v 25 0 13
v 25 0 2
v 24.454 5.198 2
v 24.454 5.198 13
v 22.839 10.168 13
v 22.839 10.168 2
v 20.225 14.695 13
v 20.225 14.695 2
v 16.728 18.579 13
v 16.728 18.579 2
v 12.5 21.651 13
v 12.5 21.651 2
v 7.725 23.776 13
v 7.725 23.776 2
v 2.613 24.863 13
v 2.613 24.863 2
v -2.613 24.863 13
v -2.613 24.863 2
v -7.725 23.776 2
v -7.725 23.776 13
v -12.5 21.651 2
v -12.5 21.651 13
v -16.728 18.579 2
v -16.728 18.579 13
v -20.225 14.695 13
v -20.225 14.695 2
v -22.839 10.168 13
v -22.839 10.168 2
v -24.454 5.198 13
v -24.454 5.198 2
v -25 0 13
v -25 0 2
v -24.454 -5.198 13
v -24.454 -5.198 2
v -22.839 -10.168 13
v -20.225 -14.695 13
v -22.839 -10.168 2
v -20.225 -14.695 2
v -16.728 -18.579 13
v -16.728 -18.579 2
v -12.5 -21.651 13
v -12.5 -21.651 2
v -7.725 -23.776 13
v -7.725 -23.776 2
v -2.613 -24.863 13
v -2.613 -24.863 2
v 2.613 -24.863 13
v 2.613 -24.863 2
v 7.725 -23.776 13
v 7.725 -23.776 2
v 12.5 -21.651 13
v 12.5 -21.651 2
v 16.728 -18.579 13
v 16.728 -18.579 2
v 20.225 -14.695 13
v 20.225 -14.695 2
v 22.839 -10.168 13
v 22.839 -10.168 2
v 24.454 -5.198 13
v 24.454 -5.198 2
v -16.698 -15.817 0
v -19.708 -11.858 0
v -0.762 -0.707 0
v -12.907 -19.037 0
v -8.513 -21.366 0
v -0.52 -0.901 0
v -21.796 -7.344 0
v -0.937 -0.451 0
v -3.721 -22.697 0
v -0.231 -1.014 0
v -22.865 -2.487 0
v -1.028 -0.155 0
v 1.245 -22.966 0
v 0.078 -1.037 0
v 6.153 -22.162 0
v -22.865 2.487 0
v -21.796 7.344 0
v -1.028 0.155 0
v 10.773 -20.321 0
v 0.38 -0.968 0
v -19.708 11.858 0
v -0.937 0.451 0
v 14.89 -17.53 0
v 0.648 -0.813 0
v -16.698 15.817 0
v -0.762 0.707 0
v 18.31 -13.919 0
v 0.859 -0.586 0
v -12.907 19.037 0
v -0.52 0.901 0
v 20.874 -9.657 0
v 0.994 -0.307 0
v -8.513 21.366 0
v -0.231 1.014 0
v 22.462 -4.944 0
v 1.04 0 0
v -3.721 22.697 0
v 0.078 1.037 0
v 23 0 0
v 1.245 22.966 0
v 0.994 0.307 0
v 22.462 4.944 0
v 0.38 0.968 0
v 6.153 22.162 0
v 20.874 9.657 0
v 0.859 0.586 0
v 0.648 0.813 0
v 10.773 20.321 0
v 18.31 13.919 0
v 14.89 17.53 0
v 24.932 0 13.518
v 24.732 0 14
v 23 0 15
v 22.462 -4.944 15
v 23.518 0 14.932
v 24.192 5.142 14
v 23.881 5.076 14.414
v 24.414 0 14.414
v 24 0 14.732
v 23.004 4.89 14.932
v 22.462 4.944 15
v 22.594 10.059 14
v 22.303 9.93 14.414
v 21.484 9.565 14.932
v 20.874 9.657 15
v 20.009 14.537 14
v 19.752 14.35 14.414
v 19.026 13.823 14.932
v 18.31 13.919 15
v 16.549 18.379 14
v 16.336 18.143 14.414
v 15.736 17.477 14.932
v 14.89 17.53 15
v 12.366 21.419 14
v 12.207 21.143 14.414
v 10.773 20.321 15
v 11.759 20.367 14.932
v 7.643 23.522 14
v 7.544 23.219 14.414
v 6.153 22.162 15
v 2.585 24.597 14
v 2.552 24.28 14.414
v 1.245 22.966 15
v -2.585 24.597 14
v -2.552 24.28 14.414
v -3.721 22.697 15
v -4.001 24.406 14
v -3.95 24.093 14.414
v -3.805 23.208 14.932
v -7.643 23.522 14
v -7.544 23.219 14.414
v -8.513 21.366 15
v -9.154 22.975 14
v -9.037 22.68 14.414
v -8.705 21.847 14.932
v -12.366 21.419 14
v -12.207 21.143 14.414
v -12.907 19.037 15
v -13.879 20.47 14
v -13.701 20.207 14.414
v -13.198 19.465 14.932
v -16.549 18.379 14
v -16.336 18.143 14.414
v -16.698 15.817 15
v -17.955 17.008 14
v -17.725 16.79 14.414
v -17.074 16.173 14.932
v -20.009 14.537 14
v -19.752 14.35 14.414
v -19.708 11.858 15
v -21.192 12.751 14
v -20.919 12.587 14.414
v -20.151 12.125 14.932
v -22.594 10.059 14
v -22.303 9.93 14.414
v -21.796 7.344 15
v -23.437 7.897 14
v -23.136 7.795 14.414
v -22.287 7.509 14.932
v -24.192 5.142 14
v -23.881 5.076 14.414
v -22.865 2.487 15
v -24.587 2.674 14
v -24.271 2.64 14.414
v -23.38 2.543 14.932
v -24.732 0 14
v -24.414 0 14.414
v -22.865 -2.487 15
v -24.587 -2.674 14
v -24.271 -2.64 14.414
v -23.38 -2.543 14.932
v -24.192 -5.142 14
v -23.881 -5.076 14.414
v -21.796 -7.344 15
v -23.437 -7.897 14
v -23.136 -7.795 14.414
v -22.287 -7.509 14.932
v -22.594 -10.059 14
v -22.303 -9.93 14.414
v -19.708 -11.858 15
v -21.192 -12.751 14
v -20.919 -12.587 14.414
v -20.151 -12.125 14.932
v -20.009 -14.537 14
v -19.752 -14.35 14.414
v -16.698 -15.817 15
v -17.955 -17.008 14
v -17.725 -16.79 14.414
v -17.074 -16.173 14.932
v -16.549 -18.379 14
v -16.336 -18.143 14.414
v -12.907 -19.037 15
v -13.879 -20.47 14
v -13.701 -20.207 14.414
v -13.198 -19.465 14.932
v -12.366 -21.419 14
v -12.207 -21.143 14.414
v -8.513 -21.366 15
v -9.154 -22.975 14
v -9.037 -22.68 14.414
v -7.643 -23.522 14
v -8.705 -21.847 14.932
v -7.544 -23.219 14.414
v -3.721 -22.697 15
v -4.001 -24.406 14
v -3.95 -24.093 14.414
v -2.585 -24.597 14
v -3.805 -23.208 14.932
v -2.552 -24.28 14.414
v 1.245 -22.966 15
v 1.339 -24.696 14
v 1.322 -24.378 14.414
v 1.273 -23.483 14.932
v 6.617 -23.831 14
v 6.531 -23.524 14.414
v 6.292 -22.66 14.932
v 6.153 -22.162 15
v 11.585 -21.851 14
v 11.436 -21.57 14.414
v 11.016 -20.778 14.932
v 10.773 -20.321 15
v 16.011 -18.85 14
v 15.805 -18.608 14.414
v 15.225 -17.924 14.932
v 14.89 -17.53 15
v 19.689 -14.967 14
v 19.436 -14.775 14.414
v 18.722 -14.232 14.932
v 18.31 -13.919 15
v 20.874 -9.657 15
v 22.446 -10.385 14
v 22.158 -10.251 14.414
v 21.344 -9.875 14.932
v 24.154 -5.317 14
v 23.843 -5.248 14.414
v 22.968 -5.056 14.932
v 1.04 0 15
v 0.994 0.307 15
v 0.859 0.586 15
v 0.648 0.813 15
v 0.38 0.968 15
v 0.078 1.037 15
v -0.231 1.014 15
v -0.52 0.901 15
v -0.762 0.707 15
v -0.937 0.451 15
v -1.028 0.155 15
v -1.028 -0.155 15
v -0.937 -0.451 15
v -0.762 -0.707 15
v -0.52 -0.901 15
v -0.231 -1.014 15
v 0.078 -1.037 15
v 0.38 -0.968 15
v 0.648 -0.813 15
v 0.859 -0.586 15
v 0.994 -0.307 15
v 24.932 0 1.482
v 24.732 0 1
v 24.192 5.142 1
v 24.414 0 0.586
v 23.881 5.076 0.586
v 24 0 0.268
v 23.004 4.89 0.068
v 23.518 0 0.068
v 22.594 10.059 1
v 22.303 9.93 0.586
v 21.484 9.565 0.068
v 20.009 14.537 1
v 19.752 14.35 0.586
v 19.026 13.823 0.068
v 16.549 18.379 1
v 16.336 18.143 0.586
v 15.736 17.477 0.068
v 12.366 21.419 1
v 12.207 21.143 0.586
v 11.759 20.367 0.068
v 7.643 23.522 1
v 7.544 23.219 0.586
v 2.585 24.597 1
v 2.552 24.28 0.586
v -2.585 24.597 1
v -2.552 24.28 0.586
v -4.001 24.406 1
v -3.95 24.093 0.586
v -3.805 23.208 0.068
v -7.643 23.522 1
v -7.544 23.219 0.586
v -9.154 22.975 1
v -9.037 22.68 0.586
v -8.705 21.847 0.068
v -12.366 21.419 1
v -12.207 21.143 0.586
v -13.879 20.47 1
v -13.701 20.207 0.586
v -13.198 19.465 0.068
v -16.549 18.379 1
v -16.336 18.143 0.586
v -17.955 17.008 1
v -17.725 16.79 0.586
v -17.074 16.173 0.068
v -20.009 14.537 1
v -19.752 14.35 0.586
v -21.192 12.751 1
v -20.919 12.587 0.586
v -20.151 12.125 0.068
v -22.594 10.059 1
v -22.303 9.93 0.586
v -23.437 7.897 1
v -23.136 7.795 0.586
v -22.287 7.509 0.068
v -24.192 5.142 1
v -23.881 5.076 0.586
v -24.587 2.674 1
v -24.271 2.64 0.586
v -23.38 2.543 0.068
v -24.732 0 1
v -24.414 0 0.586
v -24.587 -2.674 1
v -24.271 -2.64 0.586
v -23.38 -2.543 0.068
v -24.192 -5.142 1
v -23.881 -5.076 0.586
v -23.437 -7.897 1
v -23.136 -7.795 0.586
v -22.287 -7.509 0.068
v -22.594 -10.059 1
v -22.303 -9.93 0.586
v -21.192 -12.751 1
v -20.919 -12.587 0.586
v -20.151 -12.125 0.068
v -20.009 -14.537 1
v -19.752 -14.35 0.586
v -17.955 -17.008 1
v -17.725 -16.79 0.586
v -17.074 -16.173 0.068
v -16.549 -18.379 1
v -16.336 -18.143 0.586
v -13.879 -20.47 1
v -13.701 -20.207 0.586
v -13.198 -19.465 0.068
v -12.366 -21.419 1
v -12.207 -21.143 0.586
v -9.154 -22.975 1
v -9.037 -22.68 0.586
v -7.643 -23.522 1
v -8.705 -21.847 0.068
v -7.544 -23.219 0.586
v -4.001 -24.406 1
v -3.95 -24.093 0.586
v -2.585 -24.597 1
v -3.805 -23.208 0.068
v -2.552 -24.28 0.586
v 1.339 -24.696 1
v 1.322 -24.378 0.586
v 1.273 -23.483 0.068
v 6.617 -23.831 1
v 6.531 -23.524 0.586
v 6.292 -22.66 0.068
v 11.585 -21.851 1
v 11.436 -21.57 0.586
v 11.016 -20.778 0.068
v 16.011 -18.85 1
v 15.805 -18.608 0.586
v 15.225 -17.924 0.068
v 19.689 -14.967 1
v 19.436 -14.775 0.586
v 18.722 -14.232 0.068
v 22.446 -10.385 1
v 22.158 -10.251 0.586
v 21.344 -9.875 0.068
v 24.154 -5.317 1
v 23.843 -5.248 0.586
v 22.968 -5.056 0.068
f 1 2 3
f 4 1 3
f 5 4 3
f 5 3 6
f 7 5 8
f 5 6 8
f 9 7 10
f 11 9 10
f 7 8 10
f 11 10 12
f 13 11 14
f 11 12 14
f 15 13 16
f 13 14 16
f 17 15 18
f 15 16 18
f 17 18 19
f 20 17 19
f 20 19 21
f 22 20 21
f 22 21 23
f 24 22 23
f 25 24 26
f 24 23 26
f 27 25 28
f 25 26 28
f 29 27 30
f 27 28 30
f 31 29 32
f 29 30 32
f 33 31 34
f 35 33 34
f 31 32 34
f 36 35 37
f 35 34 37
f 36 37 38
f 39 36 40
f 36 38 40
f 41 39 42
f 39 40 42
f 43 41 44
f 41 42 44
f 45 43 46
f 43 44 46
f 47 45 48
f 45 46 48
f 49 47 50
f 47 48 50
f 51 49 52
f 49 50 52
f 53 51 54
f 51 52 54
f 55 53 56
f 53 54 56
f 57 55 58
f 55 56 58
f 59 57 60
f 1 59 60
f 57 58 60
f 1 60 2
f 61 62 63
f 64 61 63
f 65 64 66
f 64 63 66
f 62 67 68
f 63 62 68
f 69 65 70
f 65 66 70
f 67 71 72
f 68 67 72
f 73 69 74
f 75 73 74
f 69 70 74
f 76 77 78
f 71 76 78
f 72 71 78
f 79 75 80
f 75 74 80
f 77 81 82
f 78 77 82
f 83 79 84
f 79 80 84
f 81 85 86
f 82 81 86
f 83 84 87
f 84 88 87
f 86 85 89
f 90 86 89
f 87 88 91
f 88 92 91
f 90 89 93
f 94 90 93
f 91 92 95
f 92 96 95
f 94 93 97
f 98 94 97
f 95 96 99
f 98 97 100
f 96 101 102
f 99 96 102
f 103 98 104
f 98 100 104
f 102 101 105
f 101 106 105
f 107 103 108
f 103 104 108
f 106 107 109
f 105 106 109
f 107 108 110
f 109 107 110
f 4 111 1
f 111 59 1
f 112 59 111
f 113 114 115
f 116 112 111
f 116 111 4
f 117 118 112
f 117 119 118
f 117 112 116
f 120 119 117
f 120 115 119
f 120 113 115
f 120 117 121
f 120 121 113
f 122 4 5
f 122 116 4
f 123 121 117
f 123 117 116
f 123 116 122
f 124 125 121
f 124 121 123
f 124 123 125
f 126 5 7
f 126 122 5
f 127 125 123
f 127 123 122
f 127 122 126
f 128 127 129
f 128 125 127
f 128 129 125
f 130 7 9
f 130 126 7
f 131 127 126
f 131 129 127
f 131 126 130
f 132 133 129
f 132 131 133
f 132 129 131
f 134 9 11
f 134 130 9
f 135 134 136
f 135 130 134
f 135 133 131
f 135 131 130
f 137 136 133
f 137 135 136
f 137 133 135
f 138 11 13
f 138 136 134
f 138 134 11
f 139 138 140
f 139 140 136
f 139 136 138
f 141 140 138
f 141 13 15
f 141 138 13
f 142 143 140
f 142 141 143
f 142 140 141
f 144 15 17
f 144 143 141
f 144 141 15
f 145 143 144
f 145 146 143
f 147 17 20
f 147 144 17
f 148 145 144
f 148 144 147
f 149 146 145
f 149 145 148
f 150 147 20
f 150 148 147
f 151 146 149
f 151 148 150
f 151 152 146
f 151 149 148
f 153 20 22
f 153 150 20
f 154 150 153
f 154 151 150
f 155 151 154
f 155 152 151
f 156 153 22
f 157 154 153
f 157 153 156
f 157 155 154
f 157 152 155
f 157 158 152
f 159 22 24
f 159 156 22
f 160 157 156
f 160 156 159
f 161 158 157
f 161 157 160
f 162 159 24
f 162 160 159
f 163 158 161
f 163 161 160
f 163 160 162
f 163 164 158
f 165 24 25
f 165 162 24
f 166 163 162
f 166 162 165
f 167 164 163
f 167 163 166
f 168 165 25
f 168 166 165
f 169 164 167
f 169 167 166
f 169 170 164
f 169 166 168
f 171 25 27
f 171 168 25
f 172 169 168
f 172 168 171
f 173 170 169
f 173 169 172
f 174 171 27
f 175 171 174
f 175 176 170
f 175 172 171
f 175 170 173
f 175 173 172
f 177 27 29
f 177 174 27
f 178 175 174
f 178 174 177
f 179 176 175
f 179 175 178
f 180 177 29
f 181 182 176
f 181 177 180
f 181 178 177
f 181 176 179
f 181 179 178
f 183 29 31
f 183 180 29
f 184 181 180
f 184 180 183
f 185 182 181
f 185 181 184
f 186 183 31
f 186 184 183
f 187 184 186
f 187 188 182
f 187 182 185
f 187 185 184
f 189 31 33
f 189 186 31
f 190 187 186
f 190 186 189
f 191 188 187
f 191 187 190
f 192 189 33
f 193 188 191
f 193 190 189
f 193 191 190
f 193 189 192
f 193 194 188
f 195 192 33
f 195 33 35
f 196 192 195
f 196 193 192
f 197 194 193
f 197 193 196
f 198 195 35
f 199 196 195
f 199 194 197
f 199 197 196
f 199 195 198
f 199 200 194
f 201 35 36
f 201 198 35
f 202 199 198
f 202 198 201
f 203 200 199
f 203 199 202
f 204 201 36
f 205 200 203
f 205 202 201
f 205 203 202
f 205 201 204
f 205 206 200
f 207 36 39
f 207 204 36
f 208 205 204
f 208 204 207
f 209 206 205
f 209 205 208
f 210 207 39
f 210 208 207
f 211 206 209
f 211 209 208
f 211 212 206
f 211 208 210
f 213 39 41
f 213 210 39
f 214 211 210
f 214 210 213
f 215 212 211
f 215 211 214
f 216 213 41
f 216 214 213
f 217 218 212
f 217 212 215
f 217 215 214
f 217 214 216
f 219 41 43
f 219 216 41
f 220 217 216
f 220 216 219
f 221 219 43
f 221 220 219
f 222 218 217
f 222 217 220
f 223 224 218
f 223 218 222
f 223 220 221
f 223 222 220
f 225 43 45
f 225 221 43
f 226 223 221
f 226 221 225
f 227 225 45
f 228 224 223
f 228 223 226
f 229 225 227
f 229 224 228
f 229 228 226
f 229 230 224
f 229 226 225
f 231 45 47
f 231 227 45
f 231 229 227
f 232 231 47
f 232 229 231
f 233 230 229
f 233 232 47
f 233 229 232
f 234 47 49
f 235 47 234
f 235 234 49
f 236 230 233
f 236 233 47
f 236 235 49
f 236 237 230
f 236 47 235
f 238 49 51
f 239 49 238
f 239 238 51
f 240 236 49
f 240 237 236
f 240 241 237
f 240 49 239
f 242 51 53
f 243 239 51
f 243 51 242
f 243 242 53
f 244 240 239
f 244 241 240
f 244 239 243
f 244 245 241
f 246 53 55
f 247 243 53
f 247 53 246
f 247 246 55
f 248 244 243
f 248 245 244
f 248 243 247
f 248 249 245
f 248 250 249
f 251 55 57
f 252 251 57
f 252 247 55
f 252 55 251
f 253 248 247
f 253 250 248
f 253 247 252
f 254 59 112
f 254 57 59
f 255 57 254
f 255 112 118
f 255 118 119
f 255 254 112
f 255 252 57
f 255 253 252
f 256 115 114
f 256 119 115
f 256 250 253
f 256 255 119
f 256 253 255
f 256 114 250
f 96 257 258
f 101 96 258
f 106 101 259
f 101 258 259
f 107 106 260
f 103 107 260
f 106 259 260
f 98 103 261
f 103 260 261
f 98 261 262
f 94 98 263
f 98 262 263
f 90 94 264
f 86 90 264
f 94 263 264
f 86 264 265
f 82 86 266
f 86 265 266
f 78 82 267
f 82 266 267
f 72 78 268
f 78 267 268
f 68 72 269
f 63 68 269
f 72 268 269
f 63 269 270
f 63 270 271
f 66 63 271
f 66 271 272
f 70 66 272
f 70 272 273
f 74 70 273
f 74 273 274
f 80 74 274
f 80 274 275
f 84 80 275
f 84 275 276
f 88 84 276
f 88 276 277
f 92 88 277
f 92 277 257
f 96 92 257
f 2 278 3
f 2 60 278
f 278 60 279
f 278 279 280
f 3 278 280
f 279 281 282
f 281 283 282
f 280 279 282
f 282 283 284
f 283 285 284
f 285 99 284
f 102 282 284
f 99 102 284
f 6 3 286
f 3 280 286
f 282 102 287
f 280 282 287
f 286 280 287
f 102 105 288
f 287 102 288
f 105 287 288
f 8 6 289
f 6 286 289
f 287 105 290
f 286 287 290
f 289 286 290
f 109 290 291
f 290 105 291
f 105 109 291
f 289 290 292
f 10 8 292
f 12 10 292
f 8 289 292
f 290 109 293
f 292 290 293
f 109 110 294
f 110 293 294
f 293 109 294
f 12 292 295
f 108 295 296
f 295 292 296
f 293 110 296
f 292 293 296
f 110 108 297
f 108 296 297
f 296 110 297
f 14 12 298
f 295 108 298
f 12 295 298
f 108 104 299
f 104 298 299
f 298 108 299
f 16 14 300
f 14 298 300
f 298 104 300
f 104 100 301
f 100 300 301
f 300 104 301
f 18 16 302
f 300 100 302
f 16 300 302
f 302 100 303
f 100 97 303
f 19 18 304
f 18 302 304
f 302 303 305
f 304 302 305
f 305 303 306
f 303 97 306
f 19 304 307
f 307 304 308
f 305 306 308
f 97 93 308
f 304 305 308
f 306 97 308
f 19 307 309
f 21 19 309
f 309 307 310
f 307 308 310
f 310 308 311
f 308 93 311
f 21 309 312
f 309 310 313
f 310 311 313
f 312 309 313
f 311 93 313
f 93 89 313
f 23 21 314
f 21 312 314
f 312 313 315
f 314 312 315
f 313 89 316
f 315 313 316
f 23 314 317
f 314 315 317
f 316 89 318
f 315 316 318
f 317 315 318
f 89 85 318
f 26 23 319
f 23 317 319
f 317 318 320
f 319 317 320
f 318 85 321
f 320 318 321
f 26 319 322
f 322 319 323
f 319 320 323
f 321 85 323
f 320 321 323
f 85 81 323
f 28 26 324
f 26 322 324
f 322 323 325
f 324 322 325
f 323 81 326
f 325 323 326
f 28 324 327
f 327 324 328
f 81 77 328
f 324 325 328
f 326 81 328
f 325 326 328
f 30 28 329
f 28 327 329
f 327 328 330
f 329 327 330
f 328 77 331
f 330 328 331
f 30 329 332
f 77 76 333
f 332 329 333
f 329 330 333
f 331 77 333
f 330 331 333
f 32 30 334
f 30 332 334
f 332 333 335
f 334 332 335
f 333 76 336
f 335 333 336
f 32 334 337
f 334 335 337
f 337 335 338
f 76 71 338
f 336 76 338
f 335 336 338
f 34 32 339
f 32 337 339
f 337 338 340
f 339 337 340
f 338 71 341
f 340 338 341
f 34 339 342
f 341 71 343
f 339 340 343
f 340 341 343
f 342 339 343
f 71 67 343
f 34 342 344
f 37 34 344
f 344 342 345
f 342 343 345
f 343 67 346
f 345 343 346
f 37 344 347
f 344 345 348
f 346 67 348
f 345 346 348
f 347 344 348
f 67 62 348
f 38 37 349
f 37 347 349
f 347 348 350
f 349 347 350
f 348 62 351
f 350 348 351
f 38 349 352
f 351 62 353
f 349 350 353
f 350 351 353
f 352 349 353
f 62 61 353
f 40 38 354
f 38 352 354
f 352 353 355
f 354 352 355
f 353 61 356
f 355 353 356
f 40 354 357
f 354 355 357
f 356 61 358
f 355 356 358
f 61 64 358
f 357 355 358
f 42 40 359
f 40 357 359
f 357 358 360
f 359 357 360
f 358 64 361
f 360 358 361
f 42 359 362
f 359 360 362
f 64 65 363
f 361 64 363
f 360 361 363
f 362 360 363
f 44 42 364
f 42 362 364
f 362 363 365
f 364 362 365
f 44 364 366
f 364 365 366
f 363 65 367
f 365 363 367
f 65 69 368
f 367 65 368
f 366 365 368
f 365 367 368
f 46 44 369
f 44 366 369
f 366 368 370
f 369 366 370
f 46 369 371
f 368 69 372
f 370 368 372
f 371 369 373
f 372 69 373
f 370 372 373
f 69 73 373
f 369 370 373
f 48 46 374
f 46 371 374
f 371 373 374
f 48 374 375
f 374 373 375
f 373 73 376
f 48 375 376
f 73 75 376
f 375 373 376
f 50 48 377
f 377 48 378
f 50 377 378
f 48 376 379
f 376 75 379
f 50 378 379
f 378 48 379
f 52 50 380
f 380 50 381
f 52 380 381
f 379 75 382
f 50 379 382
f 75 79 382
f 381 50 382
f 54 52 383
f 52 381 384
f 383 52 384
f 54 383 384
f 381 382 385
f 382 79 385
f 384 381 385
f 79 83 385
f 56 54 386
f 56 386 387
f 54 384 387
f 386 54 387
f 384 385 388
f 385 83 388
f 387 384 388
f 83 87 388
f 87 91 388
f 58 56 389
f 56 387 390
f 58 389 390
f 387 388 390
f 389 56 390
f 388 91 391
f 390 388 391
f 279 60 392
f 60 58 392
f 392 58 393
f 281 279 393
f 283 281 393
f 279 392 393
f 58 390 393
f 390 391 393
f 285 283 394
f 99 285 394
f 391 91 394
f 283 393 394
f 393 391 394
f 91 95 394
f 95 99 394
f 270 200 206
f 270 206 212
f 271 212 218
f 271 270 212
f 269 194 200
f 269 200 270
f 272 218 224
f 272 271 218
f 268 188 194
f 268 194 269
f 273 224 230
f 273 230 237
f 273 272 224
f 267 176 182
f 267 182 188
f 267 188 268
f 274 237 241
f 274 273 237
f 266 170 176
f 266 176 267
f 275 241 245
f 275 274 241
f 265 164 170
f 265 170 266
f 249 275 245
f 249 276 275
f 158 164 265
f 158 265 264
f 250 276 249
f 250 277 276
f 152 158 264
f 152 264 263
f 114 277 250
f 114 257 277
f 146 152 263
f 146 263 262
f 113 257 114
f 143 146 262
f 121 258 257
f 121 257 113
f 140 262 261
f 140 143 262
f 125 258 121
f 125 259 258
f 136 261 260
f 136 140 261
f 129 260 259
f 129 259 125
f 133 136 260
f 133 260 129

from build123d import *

# Parameters (mm, degrees)
SKETCH1_R           = 25
BOSS_EXTRUDE1_DEPTH = 15
FILLET1_R           = 2
SKETCH7_R           = 1.04
CUT_EXTRUDE2_DEPTH  = 39.405728804


with BuildPart() as part:
    # Sketch1 → Boss-Extrude1 (new body)
    with BuildSketch(Plane.XY):
        Circle(SKETCH1_R)
    extrude(amount=BOSS_EXTRUDE1_DEPTH)

    # Fillet1
    fillet1_edges = [part.edges().sort_by_distance(p)[0] for p in [
        (-25, 0, 0),
        (-25, 0, 15),
    ]]
    fillet(fillet1_edges, radius=FILLET1_R)

    # Sketch7 → Cut-Extrude2 (cut, through all)
    with BuildSketch(Plane.XY.offset(15)):
        Circle(SKETCH7_R)
    extrude(amount=-CUT_EXTRUDE2_DEPTH, mode=Mode.SUBTRACT)


solid = part.part
